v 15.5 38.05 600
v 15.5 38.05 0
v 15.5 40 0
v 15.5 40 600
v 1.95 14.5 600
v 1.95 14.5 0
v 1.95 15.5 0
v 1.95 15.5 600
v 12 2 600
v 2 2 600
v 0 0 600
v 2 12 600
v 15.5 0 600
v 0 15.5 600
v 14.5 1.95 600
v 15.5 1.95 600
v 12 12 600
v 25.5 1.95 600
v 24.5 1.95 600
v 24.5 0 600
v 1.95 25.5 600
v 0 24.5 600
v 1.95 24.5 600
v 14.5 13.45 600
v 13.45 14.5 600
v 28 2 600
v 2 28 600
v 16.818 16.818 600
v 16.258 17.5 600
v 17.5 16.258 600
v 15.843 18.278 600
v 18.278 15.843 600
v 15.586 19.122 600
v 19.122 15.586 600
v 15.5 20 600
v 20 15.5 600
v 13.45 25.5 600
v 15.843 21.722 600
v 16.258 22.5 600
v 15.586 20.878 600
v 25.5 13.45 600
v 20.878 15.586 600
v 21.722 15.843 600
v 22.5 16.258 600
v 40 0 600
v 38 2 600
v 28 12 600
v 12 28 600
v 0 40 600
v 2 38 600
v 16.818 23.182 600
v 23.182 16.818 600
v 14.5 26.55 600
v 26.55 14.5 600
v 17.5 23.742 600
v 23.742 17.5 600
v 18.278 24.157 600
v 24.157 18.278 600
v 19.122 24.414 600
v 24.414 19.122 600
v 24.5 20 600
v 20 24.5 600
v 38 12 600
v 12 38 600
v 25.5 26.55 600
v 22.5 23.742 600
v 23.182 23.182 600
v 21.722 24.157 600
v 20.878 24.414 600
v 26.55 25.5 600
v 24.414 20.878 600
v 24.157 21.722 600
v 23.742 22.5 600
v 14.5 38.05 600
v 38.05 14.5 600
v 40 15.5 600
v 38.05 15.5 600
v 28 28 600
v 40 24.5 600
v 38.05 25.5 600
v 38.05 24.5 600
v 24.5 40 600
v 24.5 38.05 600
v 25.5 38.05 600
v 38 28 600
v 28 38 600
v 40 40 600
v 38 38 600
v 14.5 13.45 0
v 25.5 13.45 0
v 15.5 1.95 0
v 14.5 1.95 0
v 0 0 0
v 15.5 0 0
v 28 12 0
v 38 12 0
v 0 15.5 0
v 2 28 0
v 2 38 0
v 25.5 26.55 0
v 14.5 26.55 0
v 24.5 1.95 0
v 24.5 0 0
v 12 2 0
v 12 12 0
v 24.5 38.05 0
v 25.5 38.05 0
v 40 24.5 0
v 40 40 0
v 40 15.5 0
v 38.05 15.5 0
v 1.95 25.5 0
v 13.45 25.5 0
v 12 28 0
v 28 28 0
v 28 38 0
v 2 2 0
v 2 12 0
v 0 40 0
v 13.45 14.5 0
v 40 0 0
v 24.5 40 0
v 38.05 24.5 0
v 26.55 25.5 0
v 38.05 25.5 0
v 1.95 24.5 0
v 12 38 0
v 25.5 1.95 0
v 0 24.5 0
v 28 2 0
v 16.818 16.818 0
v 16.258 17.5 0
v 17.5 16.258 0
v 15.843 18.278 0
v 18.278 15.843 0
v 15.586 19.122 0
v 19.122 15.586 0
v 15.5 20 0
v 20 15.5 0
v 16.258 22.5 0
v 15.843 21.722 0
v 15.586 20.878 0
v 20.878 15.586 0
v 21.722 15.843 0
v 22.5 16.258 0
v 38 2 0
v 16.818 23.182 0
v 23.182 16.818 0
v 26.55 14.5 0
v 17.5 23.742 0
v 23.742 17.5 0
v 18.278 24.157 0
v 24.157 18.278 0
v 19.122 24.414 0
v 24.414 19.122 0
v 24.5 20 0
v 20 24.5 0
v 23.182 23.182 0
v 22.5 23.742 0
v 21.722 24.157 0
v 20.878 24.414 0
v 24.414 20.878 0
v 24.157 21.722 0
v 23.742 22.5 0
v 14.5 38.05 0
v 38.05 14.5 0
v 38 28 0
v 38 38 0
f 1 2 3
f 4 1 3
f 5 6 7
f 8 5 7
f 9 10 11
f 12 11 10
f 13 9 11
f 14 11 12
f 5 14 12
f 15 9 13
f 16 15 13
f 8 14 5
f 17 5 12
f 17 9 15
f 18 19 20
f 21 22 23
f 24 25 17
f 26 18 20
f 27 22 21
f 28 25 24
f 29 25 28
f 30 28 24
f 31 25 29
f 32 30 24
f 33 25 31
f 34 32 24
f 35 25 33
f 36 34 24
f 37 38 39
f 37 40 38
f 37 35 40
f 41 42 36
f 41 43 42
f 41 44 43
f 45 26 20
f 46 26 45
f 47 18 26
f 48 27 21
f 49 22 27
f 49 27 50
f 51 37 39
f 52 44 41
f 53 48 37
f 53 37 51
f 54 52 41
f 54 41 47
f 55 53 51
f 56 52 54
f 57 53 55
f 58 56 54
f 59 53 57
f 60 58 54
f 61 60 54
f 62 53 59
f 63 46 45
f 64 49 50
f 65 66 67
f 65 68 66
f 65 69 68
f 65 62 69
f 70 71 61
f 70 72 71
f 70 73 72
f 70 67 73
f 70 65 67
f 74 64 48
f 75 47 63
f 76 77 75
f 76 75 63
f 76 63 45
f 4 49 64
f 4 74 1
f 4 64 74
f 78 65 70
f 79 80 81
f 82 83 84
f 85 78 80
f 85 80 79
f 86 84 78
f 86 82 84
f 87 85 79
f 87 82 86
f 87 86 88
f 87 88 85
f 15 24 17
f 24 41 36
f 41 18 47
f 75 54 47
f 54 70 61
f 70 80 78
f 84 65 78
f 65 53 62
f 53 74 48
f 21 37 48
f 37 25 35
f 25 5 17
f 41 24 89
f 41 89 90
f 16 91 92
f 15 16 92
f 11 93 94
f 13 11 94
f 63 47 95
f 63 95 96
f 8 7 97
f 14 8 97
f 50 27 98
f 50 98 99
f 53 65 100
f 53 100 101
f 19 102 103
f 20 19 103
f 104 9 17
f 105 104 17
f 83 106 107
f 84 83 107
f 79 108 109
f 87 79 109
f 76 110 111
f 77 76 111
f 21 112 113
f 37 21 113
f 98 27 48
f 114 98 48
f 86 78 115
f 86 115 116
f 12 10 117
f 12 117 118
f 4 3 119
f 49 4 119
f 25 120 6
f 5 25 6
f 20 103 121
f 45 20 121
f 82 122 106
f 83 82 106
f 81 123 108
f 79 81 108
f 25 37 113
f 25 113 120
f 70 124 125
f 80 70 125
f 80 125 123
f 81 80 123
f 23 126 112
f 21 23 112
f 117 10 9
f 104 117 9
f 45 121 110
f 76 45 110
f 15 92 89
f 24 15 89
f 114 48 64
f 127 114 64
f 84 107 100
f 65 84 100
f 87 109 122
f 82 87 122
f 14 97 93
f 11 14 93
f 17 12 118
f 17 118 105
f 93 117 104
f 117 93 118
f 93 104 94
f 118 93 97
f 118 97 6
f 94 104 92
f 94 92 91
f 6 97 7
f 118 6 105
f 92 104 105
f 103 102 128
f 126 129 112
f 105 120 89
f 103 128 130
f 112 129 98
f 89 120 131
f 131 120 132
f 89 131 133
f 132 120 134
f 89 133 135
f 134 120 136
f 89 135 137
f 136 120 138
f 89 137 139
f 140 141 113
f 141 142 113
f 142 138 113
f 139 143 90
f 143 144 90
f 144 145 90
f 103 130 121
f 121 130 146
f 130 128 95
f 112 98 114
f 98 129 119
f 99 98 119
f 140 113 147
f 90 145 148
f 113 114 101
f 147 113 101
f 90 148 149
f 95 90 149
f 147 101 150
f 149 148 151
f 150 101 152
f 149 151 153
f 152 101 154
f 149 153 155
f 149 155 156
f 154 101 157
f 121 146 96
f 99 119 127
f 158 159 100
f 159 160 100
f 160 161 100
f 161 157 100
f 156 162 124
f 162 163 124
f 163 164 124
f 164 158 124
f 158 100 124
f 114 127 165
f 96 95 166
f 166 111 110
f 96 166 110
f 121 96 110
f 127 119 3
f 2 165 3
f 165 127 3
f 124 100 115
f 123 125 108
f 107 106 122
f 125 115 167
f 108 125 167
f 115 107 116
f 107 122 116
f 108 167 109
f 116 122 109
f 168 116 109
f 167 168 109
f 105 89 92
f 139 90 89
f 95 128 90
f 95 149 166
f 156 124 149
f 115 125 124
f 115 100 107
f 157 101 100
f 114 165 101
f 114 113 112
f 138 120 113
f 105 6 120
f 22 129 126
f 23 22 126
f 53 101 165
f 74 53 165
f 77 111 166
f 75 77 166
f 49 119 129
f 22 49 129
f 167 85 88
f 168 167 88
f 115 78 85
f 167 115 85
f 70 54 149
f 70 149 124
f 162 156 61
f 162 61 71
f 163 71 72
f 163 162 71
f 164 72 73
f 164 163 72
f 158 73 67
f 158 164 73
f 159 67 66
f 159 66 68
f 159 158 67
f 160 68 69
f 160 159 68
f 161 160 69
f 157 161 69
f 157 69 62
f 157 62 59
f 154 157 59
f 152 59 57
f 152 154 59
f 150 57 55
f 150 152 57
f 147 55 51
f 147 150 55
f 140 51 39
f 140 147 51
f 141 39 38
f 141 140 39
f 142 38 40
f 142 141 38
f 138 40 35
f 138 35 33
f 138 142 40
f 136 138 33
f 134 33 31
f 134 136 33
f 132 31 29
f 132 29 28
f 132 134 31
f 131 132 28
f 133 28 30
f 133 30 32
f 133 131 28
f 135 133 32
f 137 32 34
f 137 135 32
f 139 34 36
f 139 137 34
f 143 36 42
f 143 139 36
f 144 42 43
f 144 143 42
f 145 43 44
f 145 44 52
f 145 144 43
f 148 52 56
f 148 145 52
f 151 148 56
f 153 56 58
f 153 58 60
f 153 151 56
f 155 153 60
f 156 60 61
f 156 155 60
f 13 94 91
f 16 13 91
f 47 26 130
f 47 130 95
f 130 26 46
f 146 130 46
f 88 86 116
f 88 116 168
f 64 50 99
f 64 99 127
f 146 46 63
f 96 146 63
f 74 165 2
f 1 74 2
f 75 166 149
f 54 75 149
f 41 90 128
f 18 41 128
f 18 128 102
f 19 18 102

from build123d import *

# Parameters (mm, degrees)
SKETCH_1_R      = 4.5
SKETCH_1_W      = 10
SKETCH_1_H      = 10
EXTRUDE_1_DEPTH = 600


with BuildPart() as part:
    # 草图1 → 凸台-拉伸1 (new body)
    with BuildSketch(Plane.XY):
        Polygon((0, 0), (15.5, 0), (15.5, 1.949576264), (14.5, 1.949576264), (14.5, 13.449576264), (25.5, 13.449576264), (25.5, 1.949576264), (24.5, 1.949576264), (24.5, 0), (40, 0), (40, 15.5), (38.050423736, 15.5), (38.050423736, 14.5), (26.550423736, 14.5), (26.550423736, 25.5), (38.050423736, 25.5), (38.050423736, 24.5), (40, 24.5), (40, 40), (24.5, 40), (24.5, 38.050423736), (25.5, 38.050423736), (25.5, 26.550423736), (14.5, 26.550423736), (14.5, 38.050423736), (15.5, 38.050423736), (15.5, 40), (0, 40), (0, 24.5), (1.949576264, 24.5), (1.949576264, 25.5), (13.449576264, 25.5), (13.449576264, 14.5), (1.949576264, 14.5), (1.949576264, 15.5), (0, 15.5), align=None)
        with Locations((20, 20)):
            Circle(SKETCH_1_R, mode=Mode.SUBTRACT)
        with Locations((7, 33)):
            Rectangle(SKETCH_1_W, SKETCH_1_H, mode=Mode.SUBTRACT)
        with Locations((7, 7)):
            Rectangle(SKETCH_1_W, SKETCH_1_H, mode=Mode.SUBTRACT)
        with Locations((33, 33)):
            Rectangle(SKETCH_1_W, SKETCH_1_H, mode=Mode.SUBTRACT)
        with Locations((33, 7)):
            Rectangle(SKETCH_1_W, SKETCH_1_H, mode=Mode.SUBTRACT)
    extrude(amount=EXTRUDE_1_DEPTH)


solid = part.part
